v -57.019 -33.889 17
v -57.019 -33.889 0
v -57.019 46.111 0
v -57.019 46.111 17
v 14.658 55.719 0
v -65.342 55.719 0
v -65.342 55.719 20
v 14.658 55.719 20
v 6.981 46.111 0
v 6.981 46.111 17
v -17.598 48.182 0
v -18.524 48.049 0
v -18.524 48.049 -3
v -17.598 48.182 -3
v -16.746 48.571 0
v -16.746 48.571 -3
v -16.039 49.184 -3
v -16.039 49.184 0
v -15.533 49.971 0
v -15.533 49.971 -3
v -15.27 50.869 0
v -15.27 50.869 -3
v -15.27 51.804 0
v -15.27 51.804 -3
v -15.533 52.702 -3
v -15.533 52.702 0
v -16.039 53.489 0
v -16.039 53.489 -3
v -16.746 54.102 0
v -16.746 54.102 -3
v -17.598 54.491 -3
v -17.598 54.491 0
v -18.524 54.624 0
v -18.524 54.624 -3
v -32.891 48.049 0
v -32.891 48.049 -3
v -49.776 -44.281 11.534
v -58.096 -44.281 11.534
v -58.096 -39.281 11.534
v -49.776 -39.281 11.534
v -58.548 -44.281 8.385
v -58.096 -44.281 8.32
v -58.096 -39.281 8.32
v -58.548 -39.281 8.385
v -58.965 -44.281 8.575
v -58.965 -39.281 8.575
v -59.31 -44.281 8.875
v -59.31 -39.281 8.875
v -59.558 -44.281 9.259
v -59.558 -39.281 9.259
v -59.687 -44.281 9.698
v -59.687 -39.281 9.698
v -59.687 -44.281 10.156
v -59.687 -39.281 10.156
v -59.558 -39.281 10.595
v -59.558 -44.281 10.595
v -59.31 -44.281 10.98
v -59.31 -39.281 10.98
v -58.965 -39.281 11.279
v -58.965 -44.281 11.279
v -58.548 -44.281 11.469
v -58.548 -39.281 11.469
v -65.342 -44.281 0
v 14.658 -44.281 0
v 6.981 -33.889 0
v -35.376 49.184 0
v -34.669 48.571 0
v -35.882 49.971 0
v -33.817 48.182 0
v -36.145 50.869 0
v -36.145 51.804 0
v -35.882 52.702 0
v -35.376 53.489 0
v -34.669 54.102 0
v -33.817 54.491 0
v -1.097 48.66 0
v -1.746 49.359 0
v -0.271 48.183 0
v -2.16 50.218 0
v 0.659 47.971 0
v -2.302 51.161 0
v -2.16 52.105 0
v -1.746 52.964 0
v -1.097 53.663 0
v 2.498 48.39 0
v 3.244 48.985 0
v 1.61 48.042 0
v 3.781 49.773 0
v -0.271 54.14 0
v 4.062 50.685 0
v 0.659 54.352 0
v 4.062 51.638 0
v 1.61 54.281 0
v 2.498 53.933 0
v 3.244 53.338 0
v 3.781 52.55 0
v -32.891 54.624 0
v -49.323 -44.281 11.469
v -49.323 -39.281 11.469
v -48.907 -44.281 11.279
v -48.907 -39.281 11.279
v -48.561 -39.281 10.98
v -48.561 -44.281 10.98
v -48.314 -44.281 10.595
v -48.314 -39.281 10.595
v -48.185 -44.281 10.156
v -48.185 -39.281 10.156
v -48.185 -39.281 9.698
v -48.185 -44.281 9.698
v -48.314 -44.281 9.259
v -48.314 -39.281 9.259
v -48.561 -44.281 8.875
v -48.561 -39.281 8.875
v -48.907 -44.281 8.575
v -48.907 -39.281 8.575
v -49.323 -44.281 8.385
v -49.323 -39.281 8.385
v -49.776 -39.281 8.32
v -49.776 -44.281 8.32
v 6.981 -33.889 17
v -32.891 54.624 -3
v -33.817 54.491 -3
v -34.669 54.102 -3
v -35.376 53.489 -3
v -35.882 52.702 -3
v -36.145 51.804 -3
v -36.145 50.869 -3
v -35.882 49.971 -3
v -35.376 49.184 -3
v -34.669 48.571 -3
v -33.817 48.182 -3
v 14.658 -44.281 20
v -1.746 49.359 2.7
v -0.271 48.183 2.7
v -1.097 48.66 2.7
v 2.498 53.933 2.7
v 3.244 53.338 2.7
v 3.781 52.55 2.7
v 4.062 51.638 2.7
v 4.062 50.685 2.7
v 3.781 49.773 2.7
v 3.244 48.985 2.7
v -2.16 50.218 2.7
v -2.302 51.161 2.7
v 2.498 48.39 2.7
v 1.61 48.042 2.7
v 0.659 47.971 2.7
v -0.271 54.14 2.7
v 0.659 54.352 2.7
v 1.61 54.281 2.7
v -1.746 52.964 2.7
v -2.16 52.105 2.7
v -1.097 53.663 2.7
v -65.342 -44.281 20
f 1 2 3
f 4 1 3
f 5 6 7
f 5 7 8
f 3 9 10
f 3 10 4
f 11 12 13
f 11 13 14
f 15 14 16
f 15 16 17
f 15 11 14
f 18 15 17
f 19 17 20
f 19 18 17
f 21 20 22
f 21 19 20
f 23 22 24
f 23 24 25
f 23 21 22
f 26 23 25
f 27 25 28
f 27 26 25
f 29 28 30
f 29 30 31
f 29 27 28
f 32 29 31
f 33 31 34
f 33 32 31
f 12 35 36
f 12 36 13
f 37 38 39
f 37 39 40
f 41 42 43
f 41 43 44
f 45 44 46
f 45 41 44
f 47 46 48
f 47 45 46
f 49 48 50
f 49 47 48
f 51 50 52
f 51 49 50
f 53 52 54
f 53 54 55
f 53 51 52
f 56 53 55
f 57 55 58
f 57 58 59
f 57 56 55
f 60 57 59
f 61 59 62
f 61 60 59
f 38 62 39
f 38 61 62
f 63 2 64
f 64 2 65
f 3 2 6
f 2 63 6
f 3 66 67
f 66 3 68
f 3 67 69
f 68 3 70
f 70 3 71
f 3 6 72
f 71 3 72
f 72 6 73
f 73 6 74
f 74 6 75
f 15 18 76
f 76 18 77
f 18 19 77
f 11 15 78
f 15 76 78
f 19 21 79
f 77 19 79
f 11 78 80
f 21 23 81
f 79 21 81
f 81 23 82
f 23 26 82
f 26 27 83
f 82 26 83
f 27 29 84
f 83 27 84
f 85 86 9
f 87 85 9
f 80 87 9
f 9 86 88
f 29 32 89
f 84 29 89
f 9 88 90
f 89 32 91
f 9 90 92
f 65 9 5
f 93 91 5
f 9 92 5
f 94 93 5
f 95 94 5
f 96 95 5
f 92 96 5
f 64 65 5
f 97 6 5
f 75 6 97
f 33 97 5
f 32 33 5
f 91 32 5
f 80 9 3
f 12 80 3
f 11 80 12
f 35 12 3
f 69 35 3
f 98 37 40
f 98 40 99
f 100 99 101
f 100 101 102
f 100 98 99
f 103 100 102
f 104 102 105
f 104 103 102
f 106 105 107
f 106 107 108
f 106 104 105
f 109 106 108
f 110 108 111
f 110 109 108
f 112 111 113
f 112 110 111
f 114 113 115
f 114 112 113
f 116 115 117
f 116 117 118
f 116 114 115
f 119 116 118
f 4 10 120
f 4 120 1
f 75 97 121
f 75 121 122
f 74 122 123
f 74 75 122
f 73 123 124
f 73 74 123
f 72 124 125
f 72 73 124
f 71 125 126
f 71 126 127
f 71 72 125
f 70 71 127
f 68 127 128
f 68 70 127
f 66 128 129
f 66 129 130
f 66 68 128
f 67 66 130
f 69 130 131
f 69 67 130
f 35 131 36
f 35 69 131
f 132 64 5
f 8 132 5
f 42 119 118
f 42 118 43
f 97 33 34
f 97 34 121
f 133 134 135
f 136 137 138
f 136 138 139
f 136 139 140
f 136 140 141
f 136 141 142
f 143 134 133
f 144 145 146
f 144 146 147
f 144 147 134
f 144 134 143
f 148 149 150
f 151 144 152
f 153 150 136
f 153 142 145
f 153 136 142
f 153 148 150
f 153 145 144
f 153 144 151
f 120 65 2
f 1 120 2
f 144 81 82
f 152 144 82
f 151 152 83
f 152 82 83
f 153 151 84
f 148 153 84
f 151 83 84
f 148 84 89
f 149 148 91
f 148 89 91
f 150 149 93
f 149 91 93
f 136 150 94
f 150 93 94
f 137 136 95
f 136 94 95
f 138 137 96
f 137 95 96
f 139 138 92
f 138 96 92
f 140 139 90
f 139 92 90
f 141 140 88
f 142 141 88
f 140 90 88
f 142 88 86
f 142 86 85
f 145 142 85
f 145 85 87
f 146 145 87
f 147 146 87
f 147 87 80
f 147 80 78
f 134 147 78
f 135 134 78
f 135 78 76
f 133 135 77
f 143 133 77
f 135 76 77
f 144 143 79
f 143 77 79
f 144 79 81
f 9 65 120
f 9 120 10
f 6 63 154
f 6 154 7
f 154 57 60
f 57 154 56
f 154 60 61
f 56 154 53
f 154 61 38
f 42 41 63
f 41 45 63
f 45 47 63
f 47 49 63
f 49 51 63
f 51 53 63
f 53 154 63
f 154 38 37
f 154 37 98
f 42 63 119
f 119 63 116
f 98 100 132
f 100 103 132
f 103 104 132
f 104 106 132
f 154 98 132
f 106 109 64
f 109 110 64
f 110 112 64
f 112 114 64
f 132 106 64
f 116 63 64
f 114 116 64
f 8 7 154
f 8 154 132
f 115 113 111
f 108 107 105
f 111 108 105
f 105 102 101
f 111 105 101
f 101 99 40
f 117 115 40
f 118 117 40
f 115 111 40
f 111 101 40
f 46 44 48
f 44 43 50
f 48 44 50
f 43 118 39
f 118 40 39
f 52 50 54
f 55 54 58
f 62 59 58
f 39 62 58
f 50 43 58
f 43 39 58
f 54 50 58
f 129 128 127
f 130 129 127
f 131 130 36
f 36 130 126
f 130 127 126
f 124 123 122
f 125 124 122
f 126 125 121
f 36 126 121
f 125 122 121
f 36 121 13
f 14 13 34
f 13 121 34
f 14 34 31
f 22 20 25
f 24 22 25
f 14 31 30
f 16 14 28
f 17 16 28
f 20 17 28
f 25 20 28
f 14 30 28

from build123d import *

# Parameters (mm, degrees)
SKETCH1_W           = 80
SKETCH1_H           = 100
BOSS_EXTRUDE1_DEPTH = 20
SKETCH2_W           = 64
SKETCH2_H           = 80
CUT_EXTRUDE1_DEPTH  = 17
BOSS_EXTRUDE2_DEPTH = 3
SKETCH5_R           = 3.199851011
CUT_EXTRUDE2_DEPTH  = 2.7
CUT_EXTRUDE3_DEPTH  = 5


with BuildPart() as part:
    # Sketch1 → Boss-Extrude1 (new body)
    with BuildSketch(Plane.XY):
        with Locations((-25.342231874, 5.71880103)):
            Rectangle(SKETCH1_W, SKETCH1_H)
    extrude(amount=BOSS_EXTRUDE1_DEPTH)

    # Sketch2 → Cut-Extrude1 (cut)
    with BuildSketch(Plane(origin=(0, 0, 0), x_dir=(-1, 0, 0), z_dir=(0, 0, -1))):
        with Locations((25.018703927, 6.11109777)):
            Rectangle(SKETCH2_W, SKETCH2_H)
    extrude(amount=-CUT_EXTRUDE1_DEPTH, mode=Mode.SUBTRACT)

    # Sketch3 → Boss-Extrude2 (add)
    with BuildSketch(Plane(origin=(0, 0, 0), x_dir=(-1, 0, 0), z_dir=(0, 0, -1))):
        with BuildLine():
            Line((18.523780304, 54.623908994), (32.891231828, 54.623908994))
            ThreePointArc((32.891231828, 54.623908994), (36.178699549, 51.336441272), (32.891231828, 48.048973551))
            Line((32.891231828, 48.048973551), (18.523780304, 48.048973551))
            ThreePointArc((18.523780304, 48.048973551), (15.236312582, 51.336441272), (18.523780304, 54.623908994))
        make_face()
    extrude(amount=BOSS_EXTRUDE2_DEPTH)

    # Sketch5 → Cut-Extrude2 (cut)
    with BuildSketch(Plane(origin=(0, 0, 0), x_dir=(-1, 0, 0), z_dir=(0, 0, -1))):
        with Locations((-0.897871535, 51.161432221)):
            Circle(SKETCH5_R)
    extrude(amount=-CUT_EXTRUDE2_DEPTH, mode=Mode.SUBTRACT)

    # Sketch8 → Cut-Extrude3 (cut)
    with BuildSketch(Plane.XZ.offset(44.28119897)):
        with BuildLine():
            Line((-58.0956261, 11.534398485), (-49.77573211, 11.534398485))
            ThreePointArc((-49.77573211, 11.534398485), (-48.168479863, 9.927146237), (-49.77573211, 8.319893989))
            Line((-49.77573211, 8.319893989), (-58.0956261, 8.319893989))
            ThreePointArc((-58.0956261, 8.319893989), (-59.702878348, 9.927146237), (-58.0956261, 11.534398485))
        make_face()
    extrude(amount=-CUT_EXTRUDE3_DEPTH, mode=Mode.SUBTRACT)


solid = part.part
